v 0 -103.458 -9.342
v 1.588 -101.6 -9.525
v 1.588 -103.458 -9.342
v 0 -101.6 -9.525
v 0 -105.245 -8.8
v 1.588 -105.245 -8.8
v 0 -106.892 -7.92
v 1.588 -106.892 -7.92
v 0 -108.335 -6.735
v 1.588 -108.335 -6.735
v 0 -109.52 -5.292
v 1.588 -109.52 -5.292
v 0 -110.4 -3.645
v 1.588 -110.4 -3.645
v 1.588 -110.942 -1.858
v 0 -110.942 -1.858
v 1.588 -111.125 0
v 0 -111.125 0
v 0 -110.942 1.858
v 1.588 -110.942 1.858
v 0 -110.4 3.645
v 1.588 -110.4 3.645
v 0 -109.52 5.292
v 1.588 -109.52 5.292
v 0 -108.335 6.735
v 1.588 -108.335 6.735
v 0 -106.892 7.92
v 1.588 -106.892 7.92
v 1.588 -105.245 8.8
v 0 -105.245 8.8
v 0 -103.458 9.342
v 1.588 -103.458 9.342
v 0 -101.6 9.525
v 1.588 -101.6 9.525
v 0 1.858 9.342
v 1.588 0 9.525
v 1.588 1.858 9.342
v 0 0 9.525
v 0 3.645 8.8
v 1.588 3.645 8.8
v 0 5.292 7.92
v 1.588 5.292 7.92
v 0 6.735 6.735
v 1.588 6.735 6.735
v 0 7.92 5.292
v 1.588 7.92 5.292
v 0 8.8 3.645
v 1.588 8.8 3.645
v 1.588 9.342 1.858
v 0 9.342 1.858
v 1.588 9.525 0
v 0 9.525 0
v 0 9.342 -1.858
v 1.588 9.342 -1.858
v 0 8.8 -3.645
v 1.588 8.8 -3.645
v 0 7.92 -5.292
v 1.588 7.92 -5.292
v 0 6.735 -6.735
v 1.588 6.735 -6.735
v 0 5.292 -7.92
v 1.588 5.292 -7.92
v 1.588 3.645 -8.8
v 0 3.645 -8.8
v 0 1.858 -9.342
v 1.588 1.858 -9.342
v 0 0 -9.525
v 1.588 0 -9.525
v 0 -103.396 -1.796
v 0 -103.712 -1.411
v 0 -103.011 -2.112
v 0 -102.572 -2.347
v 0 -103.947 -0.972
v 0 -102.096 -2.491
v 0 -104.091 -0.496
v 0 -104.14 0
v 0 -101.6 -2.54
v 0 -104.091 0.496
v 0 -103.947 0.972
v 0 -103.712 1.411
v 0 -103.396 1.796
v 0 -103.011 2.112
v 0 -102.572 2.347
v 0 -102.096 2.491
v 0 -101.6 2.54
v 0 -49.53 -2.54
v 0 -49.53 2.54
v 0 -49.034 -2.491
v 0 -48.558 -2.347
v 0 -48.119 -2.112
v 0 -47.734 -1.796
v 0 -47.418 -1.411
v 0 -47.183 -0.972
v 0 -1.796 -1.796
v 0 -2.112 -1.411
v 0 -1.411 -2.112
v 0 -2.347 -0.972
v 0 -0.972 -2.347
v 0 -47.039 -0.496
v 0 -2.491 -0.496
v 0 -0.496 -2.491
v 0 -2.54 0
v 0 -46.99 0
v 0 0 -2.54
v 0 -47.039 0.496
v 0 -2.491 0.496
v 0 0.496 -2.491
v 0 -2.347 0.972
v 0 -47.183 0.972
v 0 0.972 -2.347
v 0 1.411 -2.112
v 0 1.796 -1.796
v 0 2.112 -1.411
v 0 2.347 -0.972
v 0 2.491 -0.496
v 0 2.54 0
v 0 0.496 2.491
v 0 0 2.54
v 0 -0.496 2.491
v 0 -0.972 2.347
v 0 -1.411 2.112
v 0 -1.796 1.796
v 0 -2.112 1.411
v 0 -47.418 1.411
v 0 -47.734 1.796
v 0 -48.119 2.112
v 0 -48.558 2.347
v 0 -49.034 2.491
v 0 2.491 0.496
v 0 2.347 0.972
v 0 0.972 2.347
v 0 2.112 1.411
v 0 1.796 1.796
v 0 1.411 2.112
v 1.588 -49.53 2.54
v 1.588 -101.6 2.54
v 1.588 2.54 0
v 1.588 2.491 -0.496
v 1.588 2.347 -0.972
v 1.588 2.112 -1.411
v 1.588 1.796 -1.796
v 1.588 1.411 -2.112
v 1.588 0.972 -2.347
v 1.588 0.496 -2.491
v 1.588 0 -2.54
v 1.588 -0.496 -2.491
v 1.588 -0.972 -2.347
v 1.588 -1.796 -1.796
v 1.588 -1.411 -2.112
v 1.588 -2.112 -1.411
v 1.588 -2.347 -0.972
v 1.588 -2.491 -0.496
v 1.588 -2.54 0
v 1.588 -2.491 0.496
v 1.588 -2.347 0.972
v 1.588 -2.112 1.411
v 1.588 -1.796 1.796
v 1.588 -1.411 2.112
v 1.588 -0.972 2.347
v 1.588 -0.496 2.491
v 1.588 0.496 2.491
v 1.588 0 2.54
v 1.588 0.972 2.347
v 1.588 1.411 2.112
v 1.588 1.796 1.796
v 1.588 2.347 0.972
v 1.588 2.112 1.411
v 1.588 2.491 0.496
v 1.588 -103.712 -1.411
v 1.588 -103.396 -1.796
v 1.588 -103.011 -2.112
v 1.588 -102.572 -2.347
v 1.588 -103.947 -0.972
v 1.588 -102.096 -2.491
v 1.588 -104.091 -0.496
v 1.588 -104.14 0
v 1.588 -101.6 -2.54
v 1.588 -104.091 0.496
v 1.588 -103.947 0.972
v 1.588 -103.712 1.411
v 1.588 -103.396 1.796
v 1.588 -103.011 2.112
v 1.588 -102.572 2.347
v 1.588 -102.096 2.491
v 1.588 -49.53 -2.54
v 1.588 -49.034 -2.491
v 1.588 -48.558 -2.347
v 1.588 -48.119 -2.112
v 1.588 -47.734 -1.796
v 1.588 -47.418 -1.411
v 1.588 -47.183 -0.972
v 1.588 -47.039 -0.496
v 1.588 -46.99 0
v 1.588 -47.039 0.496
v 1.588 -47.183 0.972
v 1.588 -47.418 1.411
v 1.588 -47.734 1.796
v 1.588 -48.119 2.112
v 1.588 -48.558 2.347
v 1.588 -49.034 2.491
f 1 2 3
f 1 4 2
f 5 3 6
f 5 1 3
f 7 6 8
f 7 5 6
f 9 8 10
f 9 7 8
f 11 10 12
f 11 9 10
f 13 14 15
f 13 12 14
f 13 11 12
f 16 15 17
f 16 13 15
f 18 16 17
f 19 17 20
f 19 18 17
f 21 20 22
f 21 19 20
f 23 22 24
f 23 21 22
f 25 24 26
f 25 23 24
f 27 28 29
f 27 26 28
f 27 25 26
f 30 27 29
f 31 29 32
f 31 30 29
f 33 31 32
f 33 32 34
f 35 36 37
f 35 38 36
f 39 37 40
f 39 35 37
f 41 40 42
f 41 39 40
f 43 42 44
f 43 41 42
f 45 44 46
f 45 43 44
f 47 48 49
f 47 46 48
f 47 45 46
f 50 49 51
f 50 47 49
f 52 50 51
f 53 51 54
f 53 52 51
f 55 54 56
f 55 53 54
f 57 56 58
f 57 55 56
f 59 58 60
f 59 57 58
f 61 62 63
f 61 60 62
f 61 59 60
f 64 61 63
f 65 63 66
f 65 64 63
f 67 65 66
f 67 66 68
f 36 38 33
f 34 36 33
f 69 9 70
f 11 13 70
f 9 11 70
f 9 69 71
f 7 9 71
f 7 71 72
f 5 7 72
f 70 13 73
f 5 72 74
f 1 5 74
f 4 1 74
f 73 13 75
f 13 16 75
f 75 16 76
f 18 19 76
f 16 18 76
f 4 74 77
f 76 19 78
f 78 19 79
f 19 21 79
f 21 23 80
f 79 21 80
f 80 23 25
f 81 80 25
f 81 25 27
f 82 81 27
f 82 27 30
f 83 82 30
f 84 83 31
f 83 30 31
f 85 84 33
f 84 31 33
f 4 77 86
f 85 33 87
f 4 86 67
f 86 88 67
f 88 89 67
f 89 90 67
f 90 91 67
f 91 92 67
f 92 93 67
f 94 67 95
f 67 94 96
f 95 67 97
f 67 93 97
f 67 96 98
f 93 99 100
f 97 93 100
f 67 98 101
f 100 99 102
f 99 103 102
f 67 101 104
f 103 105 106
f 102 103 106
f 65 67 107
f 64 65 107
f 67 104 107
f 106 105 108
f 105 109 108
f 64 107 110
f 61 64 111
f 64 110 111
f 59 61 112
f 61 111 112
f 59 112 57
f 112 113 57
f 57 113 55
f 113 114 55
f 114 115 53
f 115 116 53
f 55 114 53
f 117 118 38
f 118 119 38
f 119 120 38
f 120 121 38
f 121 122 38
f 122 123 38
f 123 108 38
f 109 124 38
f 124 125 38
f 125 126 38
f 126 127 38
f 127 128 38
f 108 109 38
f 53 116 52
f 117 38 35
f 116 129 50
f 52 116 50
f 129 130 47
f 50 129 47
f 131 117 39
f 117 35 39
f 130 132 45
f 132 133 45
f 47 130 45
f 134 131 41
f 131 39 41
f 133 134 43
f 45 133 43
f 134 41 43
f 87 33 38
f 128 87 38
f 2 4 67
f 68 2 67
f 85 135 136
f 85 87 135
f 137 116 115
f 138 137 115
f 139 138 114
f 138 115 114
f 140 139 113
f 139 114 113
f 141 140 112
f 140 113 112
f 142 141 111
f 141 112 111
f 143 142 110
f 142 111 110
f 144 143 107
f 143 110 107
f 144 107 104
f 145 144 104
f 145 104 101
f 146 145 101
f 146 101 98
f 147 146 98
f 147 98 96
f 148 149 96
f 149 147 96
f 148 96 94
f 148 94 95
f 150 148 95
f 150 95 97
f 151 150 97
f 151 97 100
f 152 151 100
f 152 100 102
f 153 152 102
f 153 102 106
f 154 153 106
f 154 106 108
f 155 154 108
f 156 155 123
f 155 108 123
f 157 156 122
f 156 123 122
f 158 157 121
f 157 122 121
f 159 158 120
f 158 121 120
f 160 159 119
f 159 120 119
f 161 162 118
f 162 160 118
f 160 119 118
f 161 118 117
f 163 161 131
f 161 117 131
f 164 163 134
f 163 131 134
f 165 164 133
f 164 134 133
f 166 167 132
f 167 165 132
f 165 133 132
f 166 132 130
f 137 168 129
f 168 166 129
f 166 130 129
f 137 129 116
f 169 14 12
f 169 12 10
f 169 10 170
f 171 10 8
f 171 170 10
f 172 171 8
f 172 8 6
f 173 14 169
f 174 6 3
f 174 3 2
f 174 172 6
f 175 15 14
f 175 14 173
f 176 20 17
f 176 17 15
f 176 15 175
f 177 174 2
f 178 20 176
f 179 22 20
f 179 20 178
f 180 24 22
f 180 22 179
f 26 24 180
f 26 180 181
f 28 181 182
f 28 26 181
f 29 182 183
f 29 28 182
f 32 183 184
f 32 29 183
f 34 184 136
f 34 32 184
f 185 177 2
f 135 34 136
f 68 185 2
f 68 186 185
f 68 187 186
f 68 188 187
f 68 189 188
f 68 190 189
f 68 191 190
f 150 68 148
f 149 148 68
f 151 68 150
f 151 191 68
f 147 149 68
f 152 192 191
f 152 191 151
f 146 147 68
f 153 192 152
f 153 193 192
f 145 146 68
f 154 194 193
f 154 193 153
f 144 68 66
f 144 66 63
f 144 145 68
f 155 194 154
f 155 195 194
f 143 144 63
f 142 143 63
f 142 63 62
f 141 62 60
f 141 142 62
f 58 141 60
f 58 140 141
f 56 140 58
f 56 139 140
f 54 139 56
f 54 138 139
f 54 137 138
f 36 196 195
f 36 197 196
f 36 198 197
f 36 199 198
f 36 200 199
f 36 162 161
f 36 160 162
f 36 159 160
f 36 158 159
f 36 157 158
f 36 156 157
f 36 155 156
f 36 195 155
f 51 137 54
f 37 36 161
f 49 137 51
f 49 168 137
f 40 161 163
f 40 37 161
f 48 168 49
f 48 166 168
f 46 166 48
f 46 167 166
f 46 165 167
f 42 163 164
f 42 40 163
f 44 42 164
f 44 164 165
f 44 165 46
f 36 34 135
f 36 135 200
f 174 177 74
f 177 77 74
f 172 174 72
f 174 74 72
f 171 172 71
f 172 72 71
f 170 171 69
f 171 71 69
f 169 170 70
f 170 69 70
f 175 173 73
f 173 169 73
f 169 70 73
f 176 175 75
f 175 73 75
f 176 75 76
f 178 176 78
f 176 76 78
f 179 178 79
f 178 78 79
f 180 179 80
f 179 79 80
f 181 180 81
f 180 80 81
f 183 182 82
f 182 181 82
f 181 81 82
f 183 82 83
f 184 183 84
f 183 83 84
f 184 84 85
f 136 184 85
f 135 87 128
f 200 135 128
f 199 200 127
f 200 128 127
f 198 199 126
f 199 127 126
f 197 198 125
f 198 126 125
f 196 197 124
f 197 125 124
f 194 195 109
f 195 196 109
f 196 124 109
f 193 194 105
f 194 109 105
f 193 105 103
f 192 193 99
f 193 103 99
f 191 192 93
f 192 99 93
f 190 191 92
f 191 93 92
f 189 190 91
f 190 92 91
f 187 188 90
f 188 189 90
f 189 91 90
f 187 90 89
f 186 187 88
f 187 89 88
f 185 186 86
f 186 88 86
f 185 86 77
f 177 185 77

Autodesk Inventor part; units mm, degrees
ref_plane "YZ Plane" through (0, 0, 0) normal (1, 0, 0) x (0, 1, 0)
ref_plane "XZ Plane" through (0, 0, 0) normal (0, 1, 0) x (-1, 0, 0)
ref_plane "XY Plane" through (0, 0, 0) normal (0, 0, 1) x (1, 0, 0)
sketch "Sketch1" plane through (0, 0, 0) normal (1, 0, 0) x (0, 1, 0)
  circle A0 centre (0, 0) radius 2.54
  arc A1 (0, -9.525) -> (0, 9.525) centre (0, 0) ccw
  line L0 (0, 9.525) -> (-101.6, 9.525)
  line L1 (-101.6, -9.525) -> (0, -9.525)
  arc A2 (-49.53, -2.54) -> (-49.53, 2.54) centre (-49.53, 0) ccw
  line L2 (-49.53, 2.54) -> (-101.6, 2.54)
  line L3 (-49.53, -2.54) -> (-101.6, -2.54)
  arc A3 (-101.6, 2.54) -> (-101.6, -2.54) centre (-101.6, 0) ccw
  arc A4 (-101.6, 9.525) -> (-101.6, -9.525) centre (-101.6, 0) ccw
  point P0 (-111.76, 0)
  dimension "d0" = 5.08
  dimension "d12" = 5.08
  dimension "d17" = 52.07
extrude "Extrusion1" add sketch "Sketch1" along normal blind 1.5875
properties part number "hgsupport"
